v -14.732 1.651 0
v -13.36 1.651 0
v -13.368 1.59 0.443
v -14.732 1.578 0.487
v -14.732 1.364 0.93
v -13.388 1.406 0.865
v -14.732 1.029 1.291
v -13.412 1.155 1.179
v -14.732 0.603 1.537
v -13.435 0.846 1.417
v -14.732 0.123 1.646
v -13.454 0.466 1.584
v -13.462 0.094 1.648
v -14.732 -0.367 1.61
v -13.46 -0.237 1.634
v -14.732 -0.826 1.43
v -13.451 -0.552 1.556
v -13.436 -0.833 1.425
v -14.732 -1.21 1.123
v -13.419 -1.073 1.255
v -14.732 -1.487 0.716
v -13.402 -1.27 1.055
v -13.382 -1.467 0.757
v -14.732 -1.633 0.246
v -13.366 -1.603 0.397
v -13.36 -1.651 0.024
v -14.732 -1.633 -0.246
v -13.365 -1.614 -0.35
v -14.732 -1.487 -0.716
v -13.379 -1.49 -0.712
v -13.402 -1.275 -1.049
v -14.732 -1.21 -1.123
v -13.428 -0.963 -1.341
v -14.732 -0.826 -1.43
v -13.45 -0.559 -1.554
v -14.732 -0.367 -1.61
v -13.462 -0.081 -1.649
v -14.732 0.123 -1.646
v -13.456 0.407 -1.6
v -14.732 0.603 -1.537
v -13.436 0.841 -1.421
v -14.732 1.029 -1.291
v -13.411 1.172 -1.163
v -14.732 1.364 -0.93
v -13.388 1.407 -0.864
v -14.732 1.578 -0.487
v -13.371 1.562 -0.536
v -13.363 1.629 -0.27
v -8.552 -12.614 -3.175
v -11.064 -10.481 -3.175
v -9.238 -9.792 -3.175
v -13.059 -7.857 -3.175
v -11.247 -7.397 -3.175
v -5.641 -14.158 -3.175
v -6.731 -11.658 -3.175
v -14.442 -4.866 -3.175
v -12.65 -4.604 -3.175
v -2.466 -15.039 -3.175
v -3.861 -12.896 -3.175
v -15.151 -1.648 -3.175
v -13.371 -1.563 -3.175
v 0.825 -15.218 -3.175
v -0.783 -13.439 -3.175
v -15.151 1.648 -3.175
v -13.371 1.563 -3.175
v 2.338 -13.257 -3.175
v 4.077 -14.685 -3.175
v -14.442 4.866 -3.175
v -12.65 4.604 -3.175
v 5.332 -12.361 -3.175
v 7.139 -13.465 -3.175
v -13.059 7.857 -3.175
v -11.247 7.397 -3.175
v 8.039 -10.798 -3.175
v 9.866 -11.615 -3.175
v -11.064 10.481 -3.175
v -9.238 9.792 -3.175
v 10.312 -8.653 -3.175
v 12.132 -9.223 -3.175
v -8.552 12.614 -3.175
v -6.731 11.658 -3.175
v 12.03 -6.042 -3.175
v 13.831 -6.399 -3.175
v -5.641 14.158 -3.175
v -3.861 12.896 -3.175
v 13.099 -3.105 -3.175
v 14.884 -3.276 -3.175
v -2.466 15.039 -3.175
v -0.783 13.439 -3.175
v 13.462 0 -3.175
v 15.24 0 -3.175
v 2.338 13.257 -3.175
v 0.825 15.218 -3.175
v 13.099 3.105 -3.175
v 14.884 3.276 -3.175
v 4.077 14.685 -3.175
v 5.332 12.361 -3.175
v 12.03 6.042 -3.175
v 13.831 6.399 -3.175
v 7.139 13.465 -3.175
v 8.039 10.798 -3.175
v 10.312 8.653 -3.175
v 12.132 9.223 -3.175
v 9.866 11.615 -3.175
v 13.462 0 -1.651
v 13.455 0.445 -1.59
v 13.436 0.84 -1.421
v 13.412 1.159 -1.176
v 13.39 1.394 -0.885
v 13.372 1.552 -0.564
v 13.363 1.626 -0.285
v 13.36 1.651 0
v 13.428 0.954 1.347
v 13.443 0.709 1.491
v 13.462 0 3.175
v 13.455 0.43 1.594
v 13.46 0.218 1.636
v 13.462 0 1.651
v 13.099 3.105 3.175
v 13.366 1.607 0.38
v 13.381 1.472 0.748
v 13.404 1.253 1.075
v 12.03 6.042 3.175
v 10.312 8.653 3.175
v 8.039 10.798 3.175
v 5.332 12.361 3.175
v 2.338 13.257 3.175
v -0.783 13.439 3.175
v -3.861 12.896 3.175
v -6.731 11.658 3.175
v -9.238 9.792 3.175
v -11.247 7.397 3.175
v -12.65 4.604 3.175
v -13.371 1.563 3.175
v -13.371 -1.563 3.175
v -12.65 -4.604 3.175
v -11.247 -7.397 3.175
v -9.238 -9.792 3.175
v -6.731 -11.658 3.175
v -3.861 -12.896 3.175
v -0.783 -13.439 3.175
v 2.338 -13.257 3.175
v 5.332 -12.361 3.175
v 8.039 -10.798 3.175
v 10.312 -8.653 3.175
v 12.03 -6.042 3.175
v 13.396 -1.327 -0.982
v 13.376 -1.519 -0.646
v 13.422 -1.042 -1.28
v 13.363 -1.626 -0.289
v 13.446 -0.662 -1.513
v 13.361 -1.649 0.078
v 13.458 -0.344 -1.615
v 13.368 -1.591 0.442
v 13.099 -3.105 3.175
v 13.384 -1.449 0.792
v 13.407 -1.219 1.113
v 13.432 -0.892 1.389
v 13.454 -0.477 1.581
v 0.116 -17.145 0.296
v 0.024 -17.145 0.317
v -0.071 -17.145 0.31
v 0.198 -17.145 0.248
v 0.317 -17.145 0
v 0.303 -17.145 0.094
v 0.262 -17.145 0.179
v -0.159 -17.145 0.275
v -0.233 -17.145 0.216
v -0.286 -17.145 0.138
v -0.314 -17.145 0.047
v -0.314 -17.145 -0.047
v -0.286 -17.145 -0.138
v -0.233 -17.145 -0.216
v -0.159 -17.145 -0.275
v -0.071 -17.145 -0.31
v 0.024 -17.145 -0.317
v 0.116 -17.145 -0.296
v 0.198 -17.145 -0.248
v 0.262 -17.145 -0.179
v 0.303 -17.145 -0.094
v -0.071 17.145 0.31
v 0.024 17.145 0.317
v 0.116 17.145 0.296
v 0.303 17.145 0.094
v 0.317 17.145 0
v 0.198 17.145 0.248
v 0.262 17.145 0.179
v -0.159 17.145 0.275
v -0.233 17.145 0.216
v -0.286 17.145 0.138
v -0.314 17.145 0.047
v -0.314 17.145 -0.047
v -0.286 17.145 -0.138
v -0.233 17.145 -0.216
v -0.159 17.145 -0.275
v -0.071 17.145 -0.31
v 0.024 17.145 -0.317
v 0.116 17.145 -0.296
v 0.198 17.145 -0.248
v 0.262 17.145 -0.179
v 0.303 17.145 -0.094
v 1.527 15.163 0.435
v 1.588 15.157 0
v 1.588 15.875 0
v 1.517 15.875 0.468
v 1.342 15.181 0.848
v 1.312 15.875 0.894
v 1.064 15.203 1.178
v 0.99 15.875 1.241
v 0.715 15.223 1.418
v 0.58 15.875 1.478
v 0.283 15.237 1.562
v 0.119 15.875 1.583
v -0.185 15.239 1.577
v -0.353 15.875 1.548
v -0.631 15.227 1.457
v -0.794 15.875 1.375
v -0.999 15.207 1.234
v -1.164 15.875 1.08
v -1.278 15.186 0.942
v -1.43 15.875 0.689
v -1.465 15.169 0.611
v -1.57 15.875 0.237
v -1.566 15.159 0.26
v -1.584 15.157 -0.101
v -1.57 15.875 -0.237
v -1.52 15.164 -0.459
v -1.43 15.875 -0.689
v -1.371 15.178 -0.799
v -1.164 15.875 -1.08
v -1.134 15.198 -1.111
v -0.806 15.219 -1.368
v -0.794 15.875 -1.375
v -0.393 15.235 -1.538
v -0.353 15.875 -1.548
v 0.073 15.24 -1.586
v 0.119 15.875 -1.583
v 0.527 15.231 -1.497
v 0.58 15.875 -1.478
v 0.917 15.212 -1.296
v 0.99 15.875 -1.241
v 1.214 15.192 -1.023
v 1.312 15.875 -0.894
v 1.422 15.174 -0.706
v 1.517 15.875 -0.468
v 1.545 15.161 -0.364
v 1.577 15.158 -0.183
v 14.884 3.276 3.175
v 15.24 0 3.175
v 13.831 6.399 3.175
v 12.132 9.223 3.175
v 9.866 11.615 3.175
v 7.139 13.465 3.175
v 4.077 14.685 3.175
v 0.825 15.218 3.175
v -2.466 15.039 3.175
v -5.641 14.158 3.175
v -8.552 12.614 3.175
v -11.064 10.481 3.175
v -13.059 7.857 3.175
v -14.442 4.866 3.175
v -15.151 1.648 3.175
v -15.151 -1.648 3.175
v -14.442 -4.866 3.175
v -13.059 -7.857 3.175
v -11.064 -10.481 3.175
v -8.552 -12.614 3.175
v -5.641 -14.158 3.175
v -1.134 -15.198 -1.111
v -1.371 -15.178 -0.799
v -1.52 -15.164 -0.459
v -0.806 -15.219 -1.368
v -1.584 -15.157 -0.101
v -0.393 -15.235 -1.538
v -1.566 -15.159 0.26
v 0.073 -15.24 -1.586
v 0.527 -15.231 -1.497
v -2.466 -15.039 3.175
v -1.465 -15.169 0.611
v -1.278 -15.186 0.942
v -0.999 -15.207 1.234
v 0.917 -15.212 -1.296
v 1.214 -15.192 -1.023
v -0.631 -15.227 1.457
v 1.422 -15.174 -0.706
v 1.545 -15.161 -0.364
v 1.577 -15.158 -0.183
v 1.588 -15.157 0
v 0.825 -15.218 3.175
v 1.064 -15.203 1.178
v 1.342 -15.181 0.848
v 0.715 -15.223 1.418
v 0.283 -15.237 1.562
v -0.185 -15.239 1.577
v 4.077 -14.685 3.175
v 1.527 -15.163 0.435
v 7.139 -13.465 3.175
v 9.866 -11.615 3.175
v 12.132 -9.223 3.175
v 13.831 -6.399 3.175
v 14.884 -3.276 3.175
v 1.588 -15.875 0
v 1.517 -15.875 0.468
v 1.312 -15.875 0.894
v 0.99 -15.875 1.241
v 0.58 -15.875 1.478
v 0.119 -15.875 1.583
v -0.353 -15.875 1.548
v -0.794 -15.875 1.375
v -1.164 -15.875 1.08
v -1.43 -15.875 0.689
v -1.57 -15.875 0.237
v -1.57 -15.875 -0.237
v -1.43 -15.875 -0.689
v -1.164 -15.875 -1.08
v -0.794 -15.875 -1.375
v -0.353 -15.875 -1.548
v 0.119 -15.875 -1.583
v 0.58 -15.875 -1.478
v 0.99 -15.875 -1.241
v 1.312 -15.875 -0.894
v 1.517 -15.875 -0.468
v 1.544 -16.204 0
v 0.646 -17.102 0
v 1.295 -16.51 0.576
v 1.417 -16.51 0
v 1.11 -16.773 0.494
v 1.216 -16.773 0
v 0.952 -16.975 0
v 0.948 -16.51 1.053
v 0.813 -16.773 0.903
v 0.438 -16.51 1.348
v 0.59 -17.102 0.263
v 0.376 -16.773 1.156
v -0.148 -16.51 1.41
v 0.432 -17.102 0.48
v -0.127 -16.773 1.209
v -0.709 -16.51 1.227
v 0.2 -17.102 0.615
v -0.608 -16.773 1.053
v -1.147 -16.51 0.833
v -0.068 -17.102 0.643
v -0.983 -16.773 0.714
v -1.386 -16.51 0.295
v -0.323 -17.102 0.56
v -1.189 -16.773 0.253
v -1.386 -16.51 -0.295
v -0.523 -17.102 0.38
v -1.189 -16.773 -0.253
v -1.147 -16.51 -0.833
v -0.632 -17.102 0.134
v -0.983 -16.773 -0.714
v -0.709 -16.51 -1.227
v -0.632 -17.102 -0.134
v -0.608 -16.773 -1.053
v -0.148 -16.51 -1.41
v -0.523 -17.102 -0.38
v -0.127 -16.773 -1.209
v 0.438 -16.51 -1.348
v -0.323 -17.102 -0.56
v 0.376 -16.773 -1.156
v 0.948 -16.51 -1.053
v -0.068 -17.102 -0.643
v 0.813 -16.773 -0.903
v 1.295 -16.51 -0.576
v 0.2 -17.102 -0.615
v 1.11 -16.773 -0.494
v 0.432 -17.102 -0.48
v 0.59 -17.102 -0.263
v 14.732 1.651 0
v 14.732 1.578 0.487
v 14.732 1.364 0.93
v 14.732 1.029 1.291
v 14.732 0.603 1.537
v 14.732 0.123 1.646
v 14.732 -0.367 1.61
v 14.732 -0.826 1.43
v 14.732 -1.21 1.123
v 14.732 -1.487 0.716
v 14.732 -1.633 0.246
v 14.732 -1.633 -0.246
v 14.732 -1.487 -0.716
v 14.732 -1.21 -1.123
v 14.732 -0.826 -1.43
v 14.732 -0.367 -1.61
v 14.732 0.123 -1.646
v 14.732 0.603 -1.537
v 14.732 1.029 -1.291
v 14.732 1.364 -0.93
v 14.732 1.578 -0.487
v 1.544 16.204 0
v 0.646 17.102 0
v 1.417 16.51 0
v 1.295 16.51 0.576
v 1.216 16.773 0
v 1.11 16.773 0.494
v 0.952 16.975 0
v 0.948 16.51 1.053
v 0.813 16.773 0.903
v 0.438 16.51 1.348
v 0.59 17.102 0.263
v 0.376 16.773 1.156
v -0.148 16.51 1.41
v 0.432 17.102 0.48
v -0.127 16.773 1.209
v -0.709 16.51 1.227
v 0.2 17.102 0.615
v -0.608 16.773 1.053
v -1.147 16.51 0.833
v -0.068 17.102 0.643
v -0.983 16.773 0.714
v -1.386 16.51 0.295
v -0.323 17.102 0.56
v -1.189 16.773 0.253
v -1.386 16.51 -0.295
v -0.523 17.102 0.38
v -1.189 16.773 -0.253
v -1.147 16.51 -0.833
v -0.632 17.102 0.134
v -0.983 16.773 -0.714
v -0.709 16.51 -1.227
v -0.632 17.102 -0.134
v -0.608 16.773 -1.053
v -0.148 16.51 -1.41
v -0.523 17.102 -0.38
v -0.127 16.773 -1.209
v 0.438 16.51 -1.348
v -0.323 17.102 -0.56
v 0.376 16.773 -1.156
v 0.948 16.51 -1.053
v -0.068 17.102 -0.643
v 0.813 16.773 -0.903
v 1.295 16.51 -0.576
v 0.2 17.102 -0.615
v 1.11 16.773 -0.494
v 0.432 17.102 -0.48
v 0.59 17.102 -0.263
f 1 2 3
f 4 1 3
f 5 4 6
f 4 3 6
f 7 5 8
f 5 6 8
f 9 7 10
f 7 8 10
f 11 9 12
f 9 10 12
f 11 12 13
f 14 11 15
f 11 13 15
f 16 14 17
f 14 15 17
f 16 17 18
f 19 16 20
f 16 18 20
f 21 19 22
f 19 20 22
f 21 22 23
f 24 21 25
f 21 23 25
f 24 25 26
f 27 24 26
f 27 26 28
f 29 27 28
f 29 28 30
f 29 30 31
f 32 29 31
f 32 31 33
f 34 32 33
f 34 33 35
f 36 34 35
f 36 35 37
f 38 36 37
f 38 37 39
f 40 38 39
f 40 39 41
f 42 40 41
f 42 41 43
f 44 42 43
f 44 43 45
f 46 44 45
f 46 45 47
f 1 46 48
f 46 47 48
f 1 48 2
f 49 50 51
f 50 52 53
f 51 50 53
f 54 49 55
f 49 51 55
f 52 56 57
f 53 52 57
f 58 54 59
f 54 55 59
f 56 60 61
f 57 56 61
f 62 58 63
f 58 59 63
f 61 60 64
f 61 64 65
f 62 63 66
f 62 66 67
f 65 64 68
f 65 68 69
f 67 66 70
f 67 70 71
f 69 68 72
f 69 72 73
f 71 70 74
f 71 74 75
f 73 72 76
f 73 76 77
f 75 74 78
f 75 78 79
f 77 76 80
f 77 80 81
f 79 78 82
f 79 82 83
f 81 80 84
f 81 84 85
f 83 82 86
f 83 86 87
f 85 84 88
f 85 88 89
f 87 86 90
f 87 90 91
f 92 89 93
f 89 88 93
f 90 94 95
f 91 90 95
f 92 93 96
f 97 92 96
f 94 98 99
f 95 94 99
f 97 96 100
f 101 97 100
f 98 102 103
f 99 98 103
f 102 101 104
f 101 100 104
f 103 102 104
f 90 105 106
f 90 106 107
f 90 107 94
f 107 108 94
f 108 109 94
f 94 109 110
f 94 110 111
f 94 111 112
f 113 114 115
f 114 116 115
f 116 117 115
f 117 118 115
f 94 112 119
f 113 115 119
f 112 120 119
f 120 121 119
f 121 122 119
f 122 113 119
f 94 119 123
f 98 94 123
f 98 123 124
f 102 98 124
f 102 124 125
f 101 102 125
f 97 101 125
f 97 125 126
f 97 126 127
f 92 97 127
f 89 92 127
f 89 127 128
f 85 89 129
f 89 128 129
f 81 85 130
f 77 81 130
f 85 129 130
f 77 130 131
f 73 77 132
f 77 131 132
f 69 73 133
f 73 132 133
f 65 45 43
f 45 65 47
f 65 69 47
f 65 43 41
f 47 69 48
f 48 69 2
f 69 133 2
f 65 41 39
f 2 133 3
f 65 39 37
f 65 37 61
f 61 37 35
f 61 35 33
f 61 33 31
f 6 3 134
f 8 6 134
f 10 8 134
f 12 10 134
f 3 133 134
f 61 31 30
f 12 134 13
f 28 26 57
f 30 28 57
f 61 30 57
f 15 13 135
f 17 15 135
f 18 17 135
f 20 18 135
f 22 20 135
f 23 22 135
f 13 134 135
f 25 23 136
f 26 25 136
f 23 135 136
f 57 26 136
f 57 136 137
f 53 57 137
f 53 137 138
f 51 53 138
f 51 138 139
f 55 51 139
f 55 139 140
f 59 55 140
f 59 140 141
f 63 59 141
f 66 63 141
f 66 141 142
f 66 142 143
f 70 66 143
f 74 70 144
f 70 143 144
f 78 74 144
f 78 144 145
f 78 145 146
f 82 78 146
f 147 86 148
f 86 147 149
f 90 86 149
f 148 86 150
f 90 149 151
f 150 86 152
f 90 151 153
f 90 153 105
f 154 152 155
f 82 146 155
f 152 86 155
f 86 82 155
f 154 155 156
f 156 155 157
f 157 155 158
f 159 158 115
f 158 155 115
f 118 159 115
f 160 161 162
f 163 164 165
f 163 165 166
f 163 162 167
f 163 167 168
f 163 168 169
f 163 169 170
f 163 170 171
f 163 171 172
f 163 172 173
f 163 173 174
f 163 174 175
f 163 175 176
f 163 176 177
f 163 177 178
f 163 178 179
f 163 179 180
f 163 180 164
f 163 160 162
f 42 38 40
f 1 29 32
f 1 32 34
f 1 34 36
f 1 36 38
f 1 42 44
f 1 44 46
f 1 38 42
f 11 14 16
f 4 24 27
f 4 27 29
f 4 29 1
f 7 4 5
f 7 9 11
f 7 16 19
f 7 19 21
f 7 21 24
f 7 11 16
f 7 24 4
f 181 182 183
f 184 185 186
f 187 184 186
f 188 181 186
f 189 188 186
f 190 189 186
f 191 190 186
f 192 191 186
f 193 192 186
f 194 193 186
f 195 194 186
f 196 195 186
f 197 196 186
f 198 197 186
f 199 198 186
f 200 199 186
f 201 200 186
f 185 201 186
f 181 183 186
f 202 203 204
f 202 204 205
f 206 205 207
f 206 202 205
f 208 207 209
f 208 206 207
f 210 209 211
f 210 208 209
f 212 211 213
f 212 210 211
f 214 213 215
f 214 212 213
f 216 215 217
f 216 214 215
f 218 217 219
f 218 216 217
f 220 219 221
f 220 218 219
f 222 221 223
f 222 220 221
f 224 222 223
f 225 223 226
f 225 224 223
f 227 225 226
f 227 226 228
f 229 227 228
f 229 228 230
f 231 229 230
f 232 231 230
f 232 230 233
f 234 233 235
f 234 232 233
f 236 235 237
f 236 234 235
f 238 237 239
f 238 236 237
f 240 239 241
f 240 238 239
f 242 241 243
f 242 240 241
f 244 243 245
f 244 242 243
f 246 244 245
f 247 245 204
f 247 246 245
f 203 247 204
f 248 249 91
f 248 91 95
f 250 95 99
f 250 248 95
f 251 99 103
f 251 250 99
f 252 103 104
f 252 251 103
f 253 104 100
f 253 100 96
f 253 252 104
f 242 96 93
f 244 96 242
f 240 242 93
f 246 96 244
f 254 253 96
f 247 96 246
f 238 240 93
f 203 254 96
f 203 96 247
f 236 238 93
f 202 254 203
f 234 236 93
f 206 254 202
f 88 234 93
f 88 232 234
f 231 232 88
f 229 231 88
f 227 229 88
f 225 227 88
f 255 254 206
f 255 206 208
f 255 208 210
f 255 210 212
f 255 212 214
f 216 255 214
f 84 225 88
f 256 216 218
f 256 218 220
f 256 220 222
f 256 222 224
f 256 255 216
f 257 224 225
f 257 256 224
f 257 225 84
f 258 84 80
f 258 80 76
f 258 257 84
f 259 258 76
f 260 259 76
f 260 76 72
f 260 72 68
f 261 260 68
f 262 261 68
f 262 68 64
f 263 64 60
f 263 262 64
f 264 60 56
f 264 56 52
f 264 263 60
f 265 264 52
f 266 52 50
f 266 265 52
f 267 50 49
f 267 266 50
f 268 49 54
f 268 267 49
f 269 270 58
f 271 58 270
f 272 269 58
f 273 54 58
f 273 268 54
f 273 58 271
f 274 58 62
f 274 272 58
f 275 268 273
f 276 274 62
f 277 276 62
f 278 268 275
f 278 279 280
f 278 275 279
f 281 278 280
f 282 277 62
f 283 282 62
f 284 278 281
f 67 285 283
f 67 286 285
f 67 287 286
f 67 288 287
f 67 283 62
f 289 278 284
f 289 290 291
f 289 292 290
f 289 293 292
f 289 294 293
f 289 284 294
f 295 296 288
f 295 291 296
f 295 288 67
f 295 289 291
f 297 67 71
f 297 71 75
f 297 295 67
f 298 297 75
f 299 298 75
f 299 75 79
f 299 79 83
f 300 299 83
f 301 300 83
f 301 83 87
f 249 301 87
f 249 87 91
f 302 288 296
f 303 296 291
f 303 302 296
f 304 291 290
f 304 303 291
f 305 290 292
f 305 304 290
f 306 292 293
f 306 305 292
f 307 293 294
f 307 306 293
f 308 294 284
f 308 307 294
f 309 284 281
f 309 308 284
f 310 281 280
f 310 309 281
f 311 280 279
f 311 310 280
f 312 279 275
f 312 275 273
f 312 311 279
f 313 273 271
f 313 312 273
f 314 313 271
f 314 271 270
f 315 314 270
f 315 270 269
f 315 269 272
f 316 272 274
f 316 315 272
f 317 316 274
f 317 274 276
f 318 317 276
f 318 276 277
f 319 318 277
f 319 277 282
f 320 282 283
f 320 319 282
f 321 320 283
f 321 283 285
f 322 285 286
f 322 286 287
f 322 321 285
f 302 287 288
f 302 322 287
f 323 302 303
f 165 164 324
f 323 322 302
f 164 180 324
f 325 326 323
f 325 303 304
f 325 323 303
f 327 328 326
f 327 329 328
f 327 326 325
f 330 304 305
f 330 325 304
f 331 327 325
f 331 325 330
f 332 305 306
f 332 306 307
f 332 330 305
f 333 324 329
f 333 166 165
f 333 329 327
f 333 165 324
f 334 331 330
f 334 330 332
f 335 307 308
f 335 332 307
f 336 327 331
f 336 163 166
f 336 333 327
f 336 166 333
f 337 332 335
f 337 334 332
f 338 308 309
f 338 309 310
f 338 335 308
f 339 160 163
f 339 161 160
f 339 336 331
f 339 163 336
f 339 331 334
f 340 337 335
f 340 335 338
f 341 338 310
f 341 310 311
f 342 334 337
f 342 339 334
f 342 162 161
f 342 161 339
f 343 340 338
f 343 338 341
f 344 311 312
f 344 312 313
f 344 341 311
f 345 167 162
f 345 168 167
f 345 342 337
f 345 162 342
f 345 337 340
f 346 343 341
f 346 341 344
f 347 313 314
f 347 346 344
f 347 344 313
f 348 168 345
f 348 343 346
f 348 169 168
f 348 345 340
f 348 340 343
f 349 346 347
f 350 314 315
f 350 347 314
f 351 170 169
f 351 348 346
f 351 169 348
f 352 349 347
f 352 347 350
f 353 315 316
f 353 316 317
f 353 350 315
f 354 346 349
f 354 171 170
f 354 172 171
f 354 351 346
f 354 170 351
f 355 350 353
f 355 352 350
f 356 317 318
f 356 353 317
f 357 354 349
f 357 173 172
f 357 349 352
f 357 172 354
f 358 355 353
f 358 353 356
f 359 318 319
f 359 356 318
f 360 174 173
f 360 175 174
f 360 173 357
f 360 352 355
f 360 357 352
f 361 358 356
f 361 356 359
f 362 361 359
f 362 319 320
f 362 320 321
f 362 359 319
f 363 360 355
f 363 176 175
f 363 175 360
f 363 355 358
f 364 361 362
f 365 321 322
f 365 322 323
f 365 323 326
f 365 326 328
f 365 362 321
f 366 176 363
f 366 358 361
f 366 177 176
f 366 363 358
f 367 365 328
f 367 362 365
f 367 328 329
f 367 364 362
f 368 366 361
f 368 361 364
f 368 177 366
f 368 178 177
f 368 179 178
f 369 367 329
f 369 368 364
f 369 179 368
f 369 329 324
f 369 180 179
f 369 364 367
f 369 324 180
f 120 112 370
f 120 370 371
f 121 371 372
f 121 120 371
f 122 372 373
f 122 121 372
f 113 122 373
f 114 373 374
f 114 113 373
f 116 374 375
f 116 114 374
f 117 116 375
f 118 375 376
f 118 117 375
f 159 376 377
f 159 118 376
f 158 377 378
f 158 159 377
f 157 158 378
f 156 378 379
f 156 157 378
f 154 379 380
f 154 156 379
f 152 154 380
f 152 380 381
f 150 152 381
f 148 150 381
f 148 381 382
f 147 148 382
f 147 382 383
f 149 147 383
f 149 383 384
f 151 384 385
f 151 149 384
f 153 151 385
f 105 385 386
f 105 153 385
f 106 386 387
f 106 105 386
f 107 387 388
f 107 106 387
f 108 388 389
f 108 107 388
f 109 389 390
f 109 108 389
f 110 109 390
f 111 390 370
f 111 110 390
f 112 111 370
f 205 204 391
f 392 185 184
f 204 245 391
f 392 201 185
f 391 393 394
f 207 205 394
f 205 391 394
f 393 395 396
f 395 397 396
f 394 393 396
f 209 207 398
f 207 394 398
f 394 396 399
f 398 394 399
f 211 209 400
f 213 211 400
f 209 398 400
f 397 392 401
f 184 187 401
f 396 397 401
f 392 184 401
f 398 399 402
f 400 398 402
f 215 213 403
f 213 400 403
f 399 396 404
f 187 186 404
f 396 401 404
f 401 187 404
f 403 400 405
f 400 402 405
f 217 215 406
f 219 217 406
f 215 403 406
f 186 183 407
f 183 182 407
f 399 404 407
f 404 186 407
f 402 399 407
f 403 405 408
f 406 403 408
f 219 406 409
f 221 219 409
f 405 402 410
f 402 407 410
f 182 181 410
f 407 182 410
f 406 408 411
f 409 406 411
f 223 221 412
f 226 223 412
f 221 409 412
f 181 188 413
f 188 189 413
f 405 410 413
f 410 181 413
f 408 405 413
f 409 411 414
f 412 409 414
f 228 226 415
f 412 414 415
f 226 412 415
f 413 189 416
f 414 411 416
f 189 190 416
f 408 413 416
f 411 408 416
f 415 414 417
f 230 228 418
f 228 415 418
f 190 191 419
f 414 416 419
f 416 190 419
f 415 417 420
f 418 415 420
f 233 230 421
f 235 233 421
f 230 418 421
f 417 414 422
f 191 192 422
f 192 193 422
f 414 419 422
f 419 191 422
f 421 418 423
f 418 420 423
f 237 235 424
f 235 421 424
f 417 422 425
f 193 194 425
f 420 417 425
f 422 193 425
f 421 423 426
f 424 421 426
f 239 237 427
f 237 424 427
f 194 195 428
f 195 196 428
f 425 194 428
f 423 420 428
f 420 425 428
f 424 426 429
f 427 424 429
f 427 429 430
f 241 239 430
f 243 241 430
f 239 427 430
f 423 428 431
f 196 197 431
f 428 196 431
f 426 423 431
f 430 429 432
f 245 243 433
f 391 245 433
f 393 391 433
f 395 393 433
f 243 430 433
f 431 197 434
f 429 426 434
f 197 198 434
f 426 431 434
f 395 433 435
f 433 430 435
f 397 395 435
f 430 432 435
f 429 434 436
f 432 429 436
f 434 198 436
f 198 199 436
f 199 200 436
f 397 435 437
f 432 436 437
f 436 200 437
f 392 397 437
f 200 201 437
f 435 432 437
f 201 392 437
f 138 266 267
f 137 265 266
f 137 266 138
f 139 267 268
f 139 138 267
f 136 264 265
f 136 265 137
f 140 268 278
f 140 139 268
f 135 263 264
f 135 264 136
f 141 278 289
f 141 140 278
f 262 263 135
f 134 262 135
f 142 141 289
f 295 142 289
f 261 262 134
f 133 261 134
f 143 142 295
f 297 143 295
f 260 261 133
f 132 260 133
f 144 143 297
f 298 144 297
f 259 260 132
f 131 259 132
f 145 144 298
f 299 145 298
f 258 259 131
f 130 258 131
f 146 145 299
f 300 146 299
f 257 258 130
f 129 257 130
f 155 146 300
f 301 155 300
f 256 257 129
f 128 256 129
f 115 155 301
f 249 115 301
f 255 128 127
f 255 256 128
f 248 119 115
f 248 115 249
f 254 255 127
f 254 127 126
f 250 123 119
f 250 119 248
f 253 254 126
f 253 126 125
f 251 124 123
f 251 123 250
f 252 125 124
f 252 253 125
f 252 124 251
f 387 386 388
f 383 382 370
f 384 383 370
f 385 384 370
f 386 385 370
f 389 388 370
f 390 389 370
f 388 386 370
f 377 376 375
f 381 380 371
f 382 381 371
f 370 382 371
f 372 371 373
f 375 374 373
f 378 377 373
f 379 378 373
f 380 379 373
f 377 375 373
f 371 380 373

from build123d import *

# Parameters (mm, degrees)
F0_R          = 15.24
F1_DEPTH      = 3.175
F2_R          = 1.651
F3_DEPTH      = 14.732
F3_DEPTH_BACK = 14.732
F4_R          = 1.5875
F5_DEPTH      = 17.145
F6_R          = 13.462
F7_DEPTH      = 6.3510001
F8_R          = 1.27


with BuildPart() as f1:
    # F0 (on Top) → F1 (new body, symmetric)
    with BuildSketch(Plane.XY):
        Circle(F0_R)
    extrude(amount=F1_DEPTH, both=True)

    # F2 (on Right) → F3 (cut, two sides)
    with BuildSketch(Plane.YZ) as f3_sk:
        Circle(F2_R)
    extrude(amount=-F3_DEPTH, mode=Mode.SUBTRACT)
    extrude(f3_sk.sketch, amount=F3_DEPTH_BACK, mode=Mode.SUBTRACT)

    # F4 (on Front) → F5 (join, symmetric)
    with BuildSketch(Plane.XZ):
        Circle(F4_R)
    extrude(amount=F5_DEPTH, both=True)

    # F6 (on face) → F7 (cut, through all)
    with BuildSketch(Plane.XY.offset(3.175)):
        Circle(F6_R)
    extrude(amount=-F7_DEPTH, mode=Mode.SUBTRACT)

    # F8
    f8_edges = [f1.edges().sort_by_distance(p)[0] for p in [
        (-1.5875, -17.145, 0),
        (-1.5875, 17.145, 0),
    ]]
    fillet(f8_edges, radius=F8_R)


solid = f1.part
